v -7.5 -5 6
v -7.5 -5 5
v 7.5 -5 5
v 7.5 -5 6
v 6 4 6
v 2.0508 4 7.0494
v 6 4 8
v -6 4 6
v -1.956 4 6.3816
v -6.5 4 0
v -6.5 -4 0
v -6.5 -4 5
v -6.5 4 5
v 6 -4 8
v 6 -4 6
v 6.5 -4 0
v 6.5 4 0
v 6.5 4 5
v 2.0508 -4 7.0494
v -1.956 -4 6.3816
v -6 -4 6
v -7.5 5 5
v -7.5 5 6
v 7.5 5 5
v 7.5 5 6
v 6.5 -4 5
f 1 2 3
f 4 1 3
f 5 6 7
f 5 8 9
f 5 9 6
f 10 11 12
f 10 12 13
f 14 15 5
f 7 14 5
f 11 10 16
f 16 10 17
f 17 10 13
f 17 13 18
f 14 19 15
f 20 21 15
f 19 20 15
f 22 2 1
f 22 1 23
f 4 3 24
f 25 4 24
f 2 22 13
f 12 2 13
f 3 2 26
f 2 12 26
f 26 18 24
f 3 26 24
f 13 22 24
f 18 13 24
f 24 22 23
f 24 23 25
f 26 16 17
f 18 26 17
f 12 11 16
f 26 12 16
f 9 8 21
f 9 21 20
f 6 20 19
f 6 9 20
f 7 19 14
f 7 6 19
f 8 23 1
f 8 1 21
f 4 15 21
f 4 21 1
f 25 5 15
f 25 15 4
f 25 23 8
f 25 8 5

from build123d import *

# Parameters (mm, degrees)
ESBO_O1_W                = 13
ESBO_O1_H                = 8
RESSALTO_EXTRUS_O1_DEPTH = 5
ESBO_O2_W                = 15
ESBO_O2_H                = 10
RESSALTO_EXTRUS_O2_DEPTH = 1
ESBO_O3_W                = 12
ESBO_O3_H                = 8
RESSALTO_EXTRUS_O3_DEPTH = 2
CORTE_EXTRUS_O1_START    = -8
CORTE_EXTRUS_O1_DEPTH    = 8


# Read off the part's stored shape, not the designer's step: Corte-extrusão1
with BuildPart() as part:
    # Esboço1 → Ressalto-extrusão1 (new body)
    with BuildSketch(Plane.XY):
        Rectangle(ESBO_O1_W, ESBO_O1_H)
    extrude(amount=RESSALTO_EXTRUS_O1_DEPTH)

    # Esboço2 → Ressalto-extrusão2 (add)
    with BuildSketch(Plane.XY.offset(5)):
        Rectangle(ESBO_O2_W, ESBO_O2_H)
    extrude(amount=RESSALTO_EXTRUS_O2_DEPTH)

    # Esboço3 → Ressalto-extrusão3 (add)
    with BuildSketch(Plane.XY.offset(6)):
        Rectangle(ESBO_O3_W, ESBO_O3_H)
    extrude(amount=RESSALTO_EXTRUS_O3_DEPTH)

    # Corte-extrusão1 outline → Corte-extrusão1 (cut)
    with BuildSketch(Plane.XZ.offset(4).offset(CORTE_EXTRUS_O1_START)):
        with BuildLine():
            ThreePointArc((-6, 6), (0.053343774, 6.679937356), (6, 8))
            Line((6, 8), (-6, 8))
            Line((-6, 8), (-6, 6))
        make_face()
    extrude(amount=CORTE_EXTRUS_O1_DEPTH, mode=Mode.SUBTRACT)


solid = part.part
